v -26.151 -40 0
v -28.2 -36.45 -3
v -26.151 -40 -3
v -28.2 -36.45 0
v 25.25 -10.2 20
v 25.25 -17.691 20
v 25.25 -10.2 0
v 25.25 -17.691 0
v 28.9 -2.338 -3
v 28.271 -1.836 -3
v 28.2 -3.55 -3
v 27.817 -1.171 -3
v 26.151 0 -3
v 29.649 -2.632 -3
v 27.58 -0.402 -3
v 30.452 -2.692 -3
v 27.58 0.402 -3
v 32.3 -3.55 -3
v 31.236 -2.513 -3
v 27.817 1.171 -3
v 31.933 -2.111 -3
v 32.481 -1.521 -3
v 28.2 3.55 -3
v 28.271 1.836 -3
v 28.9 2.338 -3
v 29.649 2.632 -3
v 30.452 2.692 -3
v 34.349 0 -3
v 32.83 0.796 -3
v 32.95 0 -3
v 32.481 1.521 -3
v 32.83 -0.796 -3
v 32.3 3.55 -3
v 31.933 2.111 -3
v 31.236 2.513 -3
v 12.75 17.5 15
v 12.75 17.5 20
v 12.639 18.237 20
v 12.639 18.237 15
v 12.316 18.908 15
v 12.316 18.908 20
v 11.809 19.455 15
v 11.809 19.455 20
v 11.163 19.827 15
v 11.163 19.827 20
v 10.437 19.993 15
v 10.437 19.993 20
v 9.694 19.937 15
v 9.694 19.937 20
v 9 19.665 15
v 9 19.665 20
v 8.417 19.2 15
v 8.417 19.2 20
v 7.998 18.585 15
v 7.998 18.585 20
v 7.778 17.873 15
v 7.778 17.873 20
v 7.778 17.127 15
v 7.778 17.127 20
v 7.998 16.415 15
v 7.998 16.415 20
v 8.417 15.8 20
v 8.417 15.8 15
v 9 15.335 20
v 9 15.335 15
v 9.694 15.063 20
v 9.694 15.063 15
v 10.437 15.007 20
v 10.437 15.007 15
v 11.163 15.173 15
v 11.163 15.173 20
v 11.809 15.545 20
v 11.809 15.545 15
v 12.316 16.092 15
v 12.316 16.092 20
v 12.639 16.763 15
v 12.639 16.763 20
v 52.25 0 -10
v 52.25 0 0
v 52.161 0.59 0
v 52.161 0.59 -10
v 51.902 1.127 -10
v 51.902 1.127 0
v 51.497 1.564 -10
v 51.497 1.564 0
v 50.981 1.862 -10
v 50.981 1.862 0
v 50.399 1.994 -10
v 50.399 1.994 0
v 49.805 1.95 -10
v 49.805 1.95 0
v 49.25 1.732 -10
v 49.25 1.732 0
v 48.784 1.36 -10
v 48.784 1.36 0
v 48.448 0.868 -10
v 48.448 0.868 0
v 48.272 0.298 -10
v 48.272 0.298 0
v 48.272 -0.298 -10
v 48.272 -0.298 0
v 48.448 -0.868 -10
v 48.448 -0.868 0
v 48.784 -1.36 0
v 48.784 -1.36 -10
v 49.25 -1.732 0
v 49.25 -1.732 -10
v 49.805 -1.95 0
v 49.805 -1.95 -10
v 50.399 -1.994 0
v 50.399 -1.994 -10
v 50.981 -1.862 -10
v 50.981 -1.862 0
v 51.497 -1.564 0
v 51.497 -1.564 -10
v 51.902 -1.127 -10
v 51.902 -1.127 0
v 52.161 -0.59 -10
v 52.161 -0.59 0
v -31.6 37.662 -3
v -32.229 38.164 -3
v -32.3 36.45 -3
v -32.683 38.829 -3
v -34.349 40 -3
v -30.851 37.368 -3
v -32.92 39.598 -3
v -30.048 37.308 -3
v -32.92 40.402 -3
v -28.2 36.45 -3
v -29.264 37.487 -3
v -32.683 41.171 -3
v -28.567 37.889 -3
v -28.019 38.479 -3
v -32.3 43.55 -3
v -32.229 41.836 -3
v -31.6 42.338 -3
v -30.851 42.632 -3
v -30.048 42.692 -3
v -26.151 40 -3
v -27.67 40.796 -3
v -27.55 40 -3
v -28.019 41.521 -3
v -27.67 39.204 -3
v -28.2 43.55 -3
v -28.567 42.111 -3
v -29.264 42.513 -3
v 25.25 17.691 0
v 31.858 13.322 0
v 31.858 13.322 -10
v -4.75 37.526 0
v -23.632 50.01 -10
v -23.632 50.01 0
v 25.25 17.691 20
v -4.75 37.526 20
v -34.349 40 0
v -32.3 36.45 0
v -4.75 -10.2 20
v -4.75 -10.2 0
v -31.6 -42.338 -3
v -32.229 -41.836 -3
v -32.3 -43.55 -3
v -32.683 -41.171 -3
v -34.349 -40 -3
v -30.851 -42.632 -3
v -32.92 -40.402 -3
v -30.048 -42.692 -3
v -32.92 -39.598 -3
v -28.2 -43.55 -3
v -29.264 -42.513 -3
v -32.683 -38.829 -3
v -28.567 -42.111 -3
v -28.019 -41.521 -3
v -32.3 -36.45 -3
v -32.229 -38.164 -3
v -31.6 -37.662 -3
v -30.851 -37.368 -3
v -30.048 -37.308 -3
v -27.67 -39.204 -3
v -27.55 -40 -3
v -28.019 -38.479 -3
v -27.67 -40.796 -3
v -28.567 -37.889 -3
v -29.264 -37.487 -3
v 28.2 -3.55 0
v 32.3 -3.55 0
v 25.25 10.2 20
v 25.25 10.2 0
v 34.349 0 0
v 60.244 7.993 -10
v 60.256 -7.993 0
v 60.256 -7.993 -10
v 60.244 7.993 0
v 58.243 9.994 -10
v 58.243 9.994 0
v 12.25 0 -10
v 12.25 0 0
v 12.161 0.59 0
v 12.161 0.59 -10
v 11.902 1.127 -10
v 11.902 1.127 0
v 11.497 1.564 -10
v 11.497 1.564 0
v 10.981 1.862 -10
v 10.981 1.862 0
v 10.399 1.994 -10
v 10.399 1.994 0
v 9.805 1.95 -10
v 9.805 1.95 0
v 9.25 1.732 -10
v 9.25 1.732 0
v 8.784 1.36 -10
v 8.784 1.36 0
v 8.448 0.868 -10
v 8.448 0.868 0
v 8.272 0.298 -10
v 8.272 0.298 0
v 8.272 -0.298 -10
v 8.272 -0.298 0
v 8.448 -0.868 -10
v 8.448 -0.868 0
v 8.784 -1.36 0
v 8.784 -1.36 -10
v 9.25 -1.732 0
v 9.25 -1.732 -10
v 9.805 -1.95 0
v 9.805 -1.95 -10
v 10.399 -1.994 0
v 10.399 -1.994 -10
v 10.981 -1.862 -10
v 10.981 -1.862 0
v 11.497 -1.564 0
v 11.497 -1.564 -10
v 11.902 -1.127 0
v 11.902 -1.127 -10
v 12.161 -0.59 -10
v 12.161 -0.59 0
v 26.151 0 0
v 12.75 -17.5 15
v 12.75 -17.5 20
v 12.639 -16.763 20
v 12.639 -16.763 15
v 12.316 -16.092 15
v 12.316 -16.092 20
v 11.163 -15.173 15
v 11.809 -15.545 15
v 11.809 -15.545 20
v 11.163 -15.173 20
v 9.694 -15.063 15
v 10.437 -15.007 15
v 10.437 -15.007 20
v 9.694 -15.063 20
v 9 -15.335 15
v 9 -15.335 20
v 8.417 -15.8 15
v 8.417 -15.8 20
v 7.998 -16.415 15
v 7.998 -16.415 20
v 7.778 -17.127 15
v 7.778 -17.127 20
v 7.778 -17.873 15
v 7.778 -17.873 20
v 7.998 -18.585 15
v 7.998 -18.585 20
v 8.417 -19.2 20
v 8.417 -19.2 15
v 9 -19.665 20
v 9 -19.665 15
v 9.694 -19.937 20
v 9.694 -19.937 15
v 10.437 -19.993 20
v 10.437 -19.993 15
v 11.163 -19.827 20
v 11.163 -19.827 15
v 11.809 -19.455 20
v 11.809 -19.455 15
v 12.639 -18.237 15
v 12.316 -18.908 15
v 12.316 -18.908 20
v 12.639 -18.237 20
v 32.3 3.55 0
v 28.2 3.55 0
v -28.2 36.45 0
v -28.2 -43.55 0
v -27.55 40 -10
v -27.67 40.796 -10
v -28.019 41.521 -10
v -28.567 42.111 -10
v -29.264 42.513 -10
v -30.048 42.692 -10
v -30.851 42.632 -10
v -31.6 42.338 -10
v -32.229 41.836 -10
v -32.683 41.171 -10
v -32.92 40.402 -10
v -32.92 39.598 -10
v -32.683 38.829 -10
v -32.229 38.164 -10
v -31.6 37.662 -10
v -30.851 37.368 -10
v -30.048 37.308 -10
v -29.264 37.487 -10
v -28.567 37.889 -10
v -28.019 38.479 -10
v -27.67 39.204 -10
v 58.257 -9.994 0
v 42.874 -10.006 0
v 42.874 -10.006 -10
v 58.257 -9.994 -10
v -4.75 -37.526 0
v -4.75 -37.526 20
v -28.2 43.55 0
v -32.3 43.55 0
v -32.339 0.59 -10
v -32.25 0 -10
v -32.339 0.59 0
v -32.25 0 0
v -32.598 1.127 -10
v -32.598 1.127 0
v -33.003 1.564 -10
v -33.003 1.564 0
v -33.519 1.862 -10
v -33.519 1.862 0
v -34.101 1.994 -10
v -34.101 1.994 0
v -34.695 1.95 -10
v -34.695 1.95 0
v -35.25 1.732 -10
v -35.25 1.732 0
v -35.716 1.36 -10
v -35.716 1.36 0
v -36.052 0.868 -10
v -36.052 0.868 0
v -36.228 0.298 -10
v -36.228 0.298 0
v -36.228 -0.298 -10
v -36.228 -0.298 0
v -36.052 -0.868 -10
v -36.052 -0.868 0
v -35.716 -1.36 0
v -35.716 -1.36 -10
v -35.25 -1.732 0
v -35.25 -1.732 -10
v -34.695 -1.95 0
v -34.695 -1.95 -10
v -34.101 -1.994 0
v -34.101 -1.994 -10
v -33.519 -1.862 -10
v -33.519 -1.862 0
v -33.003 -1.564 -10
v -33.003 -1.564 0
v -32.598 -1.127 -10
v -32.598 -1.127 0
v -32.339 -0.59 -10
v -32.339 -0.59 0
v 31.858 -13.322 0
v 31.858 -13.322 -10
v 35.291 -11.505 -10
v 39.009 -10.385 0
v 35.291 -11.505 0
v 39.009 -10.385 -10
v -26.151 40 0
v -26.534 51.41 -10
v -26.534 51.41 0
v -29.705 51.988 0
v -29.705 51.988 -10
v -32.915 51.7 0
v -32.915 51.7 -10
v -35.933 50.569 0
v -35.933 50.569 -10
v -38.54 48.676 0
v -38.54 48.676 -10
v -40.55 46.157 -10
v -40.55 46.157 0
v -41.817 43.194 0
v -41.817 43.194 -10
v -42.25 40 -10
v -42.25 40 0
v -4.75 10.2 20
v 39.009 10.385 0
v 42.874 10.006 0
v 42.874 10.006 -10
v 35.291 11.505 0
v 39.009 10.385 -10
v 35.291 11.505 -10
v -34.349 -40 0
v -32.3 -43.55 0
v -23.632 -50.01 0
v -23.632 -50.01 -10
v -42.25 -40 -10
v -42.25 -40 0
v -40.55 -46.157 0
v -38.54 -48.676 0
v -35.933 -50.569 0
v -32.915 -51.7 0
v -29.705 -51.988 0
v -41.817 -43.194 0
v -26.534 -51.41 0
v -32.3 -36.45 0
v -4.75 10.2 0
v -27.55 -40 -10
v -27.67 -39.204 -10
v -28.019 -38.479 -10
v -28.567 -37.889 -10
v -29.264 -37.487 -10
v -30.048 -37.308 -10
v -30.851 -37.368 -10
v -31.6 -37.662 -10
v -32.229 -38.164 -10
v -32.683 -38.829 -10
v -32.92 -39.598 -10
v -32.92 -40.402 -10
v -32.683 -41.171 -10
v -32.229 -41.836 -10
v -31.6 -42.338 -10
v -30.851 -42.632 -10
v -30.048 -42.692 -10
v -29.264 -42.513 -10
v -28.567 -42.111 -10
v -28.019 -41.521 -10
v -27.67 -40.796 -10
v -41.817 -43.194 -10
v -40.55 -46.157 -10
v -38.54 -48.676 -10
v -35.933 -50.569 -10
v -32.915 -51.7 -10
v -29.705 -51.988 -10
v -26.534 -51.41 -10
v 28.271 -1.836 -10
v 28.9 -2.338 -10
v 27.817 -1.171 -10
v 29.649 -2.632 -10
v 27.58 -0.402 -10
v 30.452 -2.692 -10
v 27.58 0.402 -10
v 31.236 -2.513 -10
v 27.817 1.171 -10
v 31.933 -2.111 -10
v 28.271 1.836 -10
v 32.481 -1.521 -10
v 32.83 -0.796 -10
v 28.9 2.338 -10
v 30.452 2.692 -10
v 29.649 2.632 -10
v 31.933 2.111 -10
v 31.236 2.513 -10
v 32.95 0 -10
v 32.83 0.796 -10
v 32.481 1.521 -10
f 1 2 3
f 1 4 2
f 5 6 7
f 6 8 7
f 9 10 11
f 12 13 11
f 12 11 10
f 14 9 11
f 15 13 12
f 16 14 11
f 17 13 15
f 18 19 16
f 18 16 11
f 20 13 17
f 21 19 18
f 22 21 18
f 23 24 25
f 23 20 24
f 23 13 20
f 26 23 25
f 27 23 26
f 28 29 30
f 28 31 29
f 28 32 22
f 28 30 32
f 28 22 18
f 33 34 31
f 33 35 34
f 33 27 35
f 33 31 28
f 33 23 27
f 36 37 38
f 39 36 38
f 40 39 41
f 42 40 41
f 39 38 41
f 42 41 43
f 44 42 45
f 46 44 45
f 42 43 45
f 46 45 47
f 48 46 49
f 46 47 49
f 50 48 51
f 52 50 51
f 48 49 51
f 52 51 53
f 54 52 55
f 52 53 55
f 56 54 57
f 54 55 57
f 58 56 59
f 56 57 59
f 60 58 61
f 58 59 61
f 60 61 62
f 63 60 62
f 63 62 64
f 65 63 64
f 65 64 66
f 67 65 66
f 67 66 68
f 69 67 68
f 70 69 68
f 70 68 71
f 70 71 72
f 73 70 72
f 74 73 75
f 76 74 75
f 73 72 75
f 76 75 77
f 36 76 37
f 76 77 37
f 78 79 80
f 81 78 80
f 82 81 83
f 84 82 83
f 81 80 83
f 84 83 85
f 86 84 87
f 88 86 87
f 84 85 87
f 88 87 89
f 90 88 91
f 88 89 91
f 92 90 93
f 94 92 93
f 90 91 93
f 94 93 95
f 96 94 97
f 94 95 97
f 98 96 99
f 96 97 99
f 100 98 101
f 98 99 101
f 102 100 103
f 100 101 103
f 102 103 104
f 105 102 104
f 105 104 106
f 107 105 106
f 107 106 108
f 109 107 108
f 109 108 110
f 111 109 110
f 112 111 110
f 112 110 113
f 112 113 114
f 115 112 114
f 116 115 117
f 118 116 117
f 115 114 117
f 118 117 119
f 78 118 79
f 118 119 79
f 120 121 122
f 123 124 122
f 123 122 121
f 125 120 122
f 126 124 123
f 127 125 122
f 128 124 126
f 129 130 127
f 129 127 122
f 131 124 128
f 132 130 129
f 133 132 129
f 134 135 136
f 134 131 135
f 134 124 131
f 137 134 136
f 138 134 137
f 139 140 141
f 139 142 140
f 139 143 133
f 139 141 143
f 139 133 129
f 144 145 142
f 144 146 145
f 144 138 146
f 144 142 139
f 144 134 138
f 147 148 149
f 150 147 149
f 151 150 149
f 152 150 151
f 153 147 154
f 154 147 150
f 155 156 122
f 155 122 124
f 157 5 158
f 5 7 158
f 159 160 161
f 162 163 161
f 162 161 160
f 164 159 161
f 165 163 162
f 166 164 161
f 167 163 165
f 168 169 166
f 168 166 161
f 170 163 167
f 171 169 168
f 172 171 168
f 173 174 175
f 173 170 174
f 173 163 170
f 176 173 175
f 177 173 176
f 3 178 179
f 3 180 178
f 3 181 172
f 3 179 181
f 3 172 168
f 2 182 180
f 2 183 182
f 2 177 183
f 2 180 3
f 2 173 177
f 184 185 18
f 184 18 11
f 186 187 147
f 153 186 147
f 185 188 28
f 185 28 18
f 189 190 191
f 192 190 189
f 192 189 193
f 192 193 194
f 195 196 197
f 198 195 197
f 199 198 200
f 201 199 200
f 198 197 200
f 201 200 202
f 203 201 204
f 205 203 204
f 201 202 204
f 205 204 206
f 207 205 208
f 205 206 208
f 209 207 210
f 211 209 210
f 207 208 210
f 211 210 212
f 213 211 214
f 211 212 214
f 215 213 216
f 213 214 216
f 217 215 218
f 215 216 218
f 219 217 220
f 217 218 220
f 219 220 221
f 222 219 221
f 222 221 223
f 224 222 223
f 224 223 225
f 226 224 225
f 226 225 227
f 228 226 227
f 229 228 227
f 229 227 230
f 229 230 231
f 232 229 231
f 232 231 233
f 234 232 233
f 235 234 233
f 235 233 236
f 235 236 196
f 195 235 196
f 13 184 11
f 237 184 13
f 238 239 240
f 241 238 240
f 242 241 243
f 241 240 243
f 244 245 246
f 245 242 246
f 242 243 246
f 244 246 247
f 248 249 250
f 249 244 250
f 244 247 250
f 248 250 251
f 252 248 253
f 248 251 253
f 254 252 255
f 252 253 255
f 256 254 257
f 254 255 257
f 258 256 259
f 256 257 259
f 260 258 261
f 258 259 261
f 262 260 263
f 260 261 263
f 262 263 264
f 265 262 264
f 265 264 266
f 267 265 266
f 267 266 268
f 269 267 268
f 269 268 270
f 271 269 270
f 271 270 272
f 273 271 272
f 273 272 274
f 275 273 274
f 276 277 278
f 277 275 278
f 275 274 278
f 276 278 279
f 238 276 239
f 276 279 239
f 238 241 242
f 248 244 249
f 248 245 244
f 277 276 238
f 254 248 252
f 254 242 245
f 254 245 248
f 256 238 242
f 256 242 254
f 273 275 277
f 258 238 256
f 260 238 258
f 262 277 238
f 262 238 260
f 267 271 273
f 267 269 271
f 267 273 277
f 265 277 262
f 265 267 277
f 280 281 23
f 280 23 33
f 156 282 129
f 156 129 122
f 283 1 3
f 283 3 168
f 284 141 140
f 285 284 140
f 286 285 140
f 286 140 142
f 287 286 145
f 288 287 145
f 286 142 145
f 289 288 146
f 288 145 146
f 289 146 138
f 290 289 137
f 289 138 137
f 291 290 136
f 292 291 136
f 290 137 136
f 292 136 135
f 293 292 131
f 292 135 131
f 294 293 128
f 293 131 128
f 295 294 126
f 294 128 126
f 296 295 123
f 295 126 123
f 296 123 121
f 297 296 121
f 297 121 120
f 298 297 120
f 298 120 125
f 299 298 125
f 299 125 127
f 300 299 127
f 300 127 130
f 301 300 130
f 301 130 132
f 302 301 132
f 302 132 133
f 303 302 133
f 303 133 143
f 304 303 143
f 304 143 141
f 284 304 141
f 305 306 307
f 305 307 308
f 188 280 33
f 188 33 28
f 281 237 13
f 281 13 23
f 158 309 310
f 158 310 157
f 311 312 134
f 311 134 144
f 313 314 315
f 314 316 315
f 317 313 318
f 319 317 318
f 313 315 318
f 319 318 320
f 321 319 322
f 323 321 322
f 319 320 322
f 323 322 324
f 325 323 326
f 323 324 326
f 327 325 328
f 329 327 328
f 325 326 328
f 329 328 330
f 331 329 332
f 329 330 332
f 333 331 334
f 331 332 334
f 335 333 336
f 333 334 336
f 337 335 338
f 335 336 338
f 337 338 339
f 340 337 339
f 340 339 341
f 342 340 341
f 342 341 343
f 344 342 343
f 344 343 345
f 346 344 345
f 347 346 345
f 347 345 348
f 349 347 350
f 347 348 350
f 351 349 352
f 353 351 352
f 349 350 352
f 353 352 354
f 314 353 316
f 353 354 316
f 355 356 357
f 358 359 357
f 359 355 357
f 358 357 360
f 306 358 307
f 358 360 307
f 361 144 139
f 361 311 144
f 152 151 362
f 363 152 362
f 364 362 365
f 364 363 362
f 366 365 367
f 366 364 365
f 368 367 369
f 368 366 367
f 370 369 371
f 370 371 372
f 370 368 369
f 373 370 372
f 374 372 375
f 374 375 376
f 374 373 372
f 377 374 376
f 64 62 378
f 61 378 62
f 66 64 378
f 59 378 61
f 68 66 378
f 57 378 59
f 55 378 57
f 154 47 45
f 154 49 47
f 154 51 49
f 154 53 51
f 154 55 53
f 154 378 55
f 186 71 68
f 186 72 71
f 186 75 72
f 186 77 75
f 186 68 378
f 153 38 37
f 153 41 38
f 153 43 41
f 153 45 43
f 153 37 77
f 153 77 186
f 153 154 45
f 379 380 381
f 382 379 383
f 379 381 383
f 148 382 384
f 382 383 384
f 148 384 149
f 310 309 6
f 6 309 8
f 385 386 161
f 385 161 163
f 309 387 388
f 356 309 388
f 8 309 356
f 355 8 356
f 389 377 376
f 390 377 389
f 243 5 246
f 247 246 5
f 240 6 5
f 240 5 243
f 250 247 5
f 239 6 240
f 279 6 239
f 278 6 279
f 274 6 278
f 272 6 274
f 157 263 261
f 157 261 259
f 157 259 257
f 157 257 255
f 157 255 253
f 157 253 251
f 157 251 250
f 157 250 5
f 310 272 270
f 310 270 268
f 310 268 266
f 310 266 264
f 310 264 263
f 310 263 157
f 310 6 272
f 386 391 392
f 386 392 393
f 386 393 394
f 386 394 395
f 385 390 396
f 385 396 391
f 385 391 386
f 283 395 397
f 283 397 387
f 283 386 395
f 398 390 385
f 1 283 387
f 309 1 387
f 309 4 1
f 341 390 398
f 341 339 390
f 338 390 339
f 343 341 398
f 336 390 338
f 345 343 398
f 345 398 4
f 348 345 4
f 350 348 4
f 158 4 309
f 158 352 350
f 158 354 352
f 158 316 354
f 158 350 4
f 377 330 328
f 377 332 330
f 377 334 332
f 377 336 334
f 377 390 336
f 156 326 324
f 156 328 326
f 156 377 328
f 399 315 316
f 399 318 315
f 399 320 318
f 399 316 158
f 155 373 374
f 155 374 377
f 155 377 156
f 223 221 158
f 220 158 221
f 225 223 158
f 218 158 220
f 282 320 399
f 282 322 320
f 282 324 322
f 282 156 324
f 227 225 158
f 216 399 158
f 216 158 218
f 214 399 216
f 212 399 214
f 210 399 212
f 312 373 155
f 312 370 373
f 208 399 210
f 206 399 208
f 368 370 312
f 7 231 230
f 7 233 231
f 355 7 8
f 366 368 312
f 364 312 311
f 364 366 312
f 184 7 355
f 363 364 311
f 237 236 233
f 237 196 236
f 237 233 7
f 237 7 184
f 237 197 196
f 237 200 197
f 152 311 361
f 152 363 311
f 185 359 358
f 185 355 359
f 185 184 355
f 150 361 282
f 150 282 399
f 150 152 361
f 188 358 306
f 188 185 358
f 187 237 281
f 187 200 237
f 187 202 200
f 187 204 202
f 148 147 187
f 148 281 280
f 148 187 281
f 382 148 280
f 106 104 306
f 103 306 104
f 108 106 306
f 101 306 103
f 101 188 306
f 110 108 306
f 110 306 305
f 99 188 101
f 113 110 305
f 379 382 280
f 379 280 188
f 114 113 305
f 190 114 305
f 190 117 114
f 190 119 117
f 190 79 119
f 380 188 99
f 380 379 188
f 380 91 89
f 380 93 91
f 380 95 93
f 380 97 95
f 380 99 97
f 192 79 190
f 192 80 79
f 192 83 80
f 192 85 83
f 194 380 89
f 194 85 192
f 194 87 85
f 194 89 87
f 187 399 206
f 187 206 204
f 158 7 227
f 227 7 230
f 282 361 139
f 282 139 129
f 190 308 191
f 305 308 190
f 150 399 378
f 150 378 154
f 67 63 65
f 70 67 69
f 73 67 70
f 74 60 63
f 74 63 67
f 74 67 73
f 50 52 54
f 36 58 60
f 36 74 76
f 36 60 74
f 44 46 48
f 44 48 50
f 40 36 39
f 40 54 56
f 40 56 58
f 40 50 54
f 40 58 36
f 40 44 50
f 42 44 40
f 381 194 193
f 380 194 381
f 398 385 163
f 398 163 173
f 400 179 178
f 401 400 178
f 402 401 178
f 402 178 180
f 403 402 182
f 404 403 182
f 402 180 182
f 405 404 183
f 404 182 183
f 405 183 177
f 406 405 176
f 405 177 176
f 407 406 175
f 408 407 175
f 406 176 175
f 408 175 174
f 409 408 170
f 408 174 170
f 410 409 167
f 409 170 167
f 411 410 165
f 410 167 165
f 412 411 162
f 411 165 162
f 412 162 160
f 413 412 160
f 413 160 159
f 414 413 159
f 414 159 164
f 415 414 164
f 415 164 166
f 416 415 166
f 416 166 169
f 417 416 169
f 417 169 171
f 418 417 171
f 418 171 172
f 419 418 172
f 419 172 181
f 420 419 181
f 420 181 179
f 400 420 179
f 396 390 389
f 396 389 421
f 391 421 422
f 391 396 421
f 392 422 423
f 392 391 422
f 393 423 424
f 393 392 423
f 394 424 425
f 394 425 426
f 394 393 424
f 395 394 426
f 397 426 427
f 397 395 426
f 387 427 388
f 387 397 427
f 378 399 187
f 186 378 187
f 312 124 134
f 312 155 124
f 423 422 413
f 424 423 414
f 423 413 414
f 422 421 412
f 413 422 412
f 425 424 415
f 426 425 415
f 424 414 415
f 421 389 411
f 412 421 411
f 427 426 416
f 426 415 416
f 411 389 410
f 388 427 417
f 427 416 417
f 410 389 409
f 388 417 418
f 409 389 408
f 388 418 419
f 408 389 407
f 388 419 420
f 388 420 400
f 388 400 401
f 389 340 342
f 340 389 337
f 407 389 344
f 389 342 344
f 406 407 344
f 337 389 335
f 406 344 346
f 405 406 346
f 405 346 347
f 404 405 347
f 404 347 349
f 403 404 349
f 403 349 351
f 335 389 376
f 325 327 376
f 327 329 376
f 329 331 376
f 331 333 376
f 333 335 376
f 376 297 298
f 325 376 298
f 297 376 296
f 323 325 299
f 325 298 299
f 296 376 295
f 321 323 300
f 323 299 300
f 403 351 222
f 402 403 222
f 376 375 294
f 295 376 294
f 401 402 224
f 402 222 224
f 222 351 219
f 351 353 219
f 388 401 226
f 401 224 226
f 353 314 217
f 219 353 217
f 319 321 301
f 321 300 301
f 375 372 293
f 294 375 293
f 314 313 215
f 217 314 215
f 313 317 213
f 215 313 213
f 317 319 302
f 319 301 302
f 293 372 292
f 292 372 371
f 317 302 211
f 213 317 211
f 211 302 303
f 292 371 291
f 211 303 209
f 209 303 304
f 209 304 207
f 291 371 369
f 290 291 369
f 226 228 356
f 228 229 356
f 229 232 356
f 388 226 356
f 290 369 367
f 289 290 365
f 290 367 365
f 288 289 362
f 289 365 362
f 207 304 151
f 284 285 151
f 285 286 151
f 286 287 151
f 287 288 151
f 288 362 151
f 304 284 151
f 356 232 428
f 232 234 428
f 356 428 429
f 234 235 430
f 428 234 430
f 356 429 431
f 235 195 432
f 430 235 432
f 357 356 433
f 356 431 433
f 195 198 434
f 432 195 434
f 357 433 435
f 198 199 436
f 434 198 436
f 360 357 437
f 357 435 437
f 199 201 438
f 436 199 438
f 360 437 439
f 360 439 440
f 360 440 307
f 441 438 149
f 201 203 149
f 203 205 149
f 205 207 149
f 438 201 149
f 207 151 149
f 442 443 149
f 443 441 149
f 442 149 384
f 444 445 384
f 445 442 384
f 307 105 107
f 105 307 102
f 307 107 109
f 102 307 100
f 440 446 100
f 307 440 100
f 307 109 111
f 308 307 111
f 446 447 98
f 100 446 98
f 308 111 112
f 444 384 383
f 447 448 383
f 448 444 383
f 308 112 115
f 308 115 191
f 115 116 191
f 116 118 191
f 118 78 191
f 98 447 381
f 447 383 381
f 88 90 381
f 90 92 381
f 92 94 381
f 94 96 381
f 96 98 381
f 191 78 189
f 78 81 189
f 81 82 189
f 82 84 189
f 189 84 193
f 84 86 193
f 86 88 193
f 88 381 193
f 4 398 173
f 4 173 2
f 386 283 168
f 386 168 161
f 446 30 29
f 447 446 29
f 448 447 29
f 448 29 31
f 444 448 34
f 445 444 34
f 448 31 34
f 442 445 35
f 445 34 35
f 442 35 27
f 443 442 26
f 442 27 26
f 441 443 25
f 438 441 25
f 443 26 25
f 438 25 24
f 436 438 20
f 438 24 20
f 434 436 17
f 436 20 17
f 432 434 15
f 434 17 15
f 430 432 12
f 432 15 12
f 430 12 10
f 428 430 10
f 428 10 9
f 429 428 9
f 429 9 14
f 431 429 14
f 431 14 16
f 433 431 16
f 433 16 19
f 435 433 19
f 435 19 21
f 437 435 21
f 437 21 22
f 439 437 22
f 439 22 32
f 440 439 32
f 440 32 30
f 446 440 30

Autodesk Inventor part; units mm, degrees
ref_plane "YZ Plane" through (0, 0, 0) normal (1, 0, 0) x (0, 1, 0)
ref_plane "XZ Plane" through (0, 0, 0) normal (0, 1, 0) x (-1, 0, 0)
ref_plane "XY Plane" through (0, 0, 0) normal (0, 0, 1) x (1, 0, 0)
sketch "Sketch1" plane through (0, 0, 0) normal (0, 0, 1) x (1, 0, 0)
  line L0 (0, 0) -> (30.25, 0) construction
  line L1 (0, 0) -> (-30.25, 0) construction
  line L2 (-30.25, 0) -> (-30.25, 40) construction
  line L3 (-30.25, 0) -> (-30.25, -40) construction
  circle A0 centre (-30.25, 40) radius 2.7
  circle A1 centre (-30.25, -40) radius 2.7
  circle A2 centre (30.25, 0) radius 2.7
  circle A3 centre (-30.25, 40) radius 12
  circle A4 centre (-30.25, -40) radius 12
  circle A5 centre (30.25, 0) radius 12
  line L4 (36.868172, -10.009985) -> (-23.631828, -50.009985)
  line L5 (-42.25, 40) -> (-42.25, -40)
  circle A6 centre (-34.25, 0) radius 2
  line L6 (-30.25, 0) -> (-34.25, 0) construction
  line L7 (-23.631828, 50.009985) -> (36.868172, 10.009985)
  line L8 (30.25, 0) -> (50.25, 0) construction
  circle A7 centre (50.25, 0) radius 10
  circle A8 centre (50.25, 0) radius 2
  line L9 (50.25746, 9.999997) -> (36.868172, 10.009985)
  line L10 (50.25746, -9.999997) -> (36.868172, -10.009985)
  circle A9 centre (10.25, 0) radius 2
  line L11 (50.25746, -9.999997) -> (60.257457, -9.992538)
  line L12 (60.257457, -9.992538) -> (60.242549, 9.992549)
  line L13 (60.242549, 9.992549) -> (50.25746, 9.999997)
  point P0 (-42.25, 0)
  point P1 (41.35, -4.559605)
  point P2 (41.35, 4.559605)
  point P3 (60.249997, 0.00746)
  dimension "d0" = 60.5
  dimension "d1" = 5.4
  dimension "d2" = 80
  dimension "d3" = 24
  dimension "d55" = 4
  dimension "d56" = 8
  dimension "d57" = 20
  dimension "d58" = 20
  dimension "d69" = 20
sketch "Sketch1 outline for Extrusion1" plane through (0, 0, 0) normal (0, 0, 1) x (1, 0, 0)
  arc A0 (-23.631828, 50.009985) -> (-42.25, 40) centre (-30.25, 40) ccw
  line L0 (-42.25, 40) -> (-42.25, -40)
  arc A1 (-42.25, -40) -> (-23.631828, -50.009985) centre (-30.25, -40) ccw
  line L1 (-23.631828, -50.009985) -> (36.868172, -10.009985)
  line L2 (36.868172, -10.009985) -> (60.257457, -9.992538)
  line L3 (60.257457, -9.992538) -> (60.242549, 9.992549)
  line L4 (60.242549, 9.992549) -> (36.868172, 10.009985)
  line L5 (36.868172, 10.009985) -> (-23.631828, 50.009985)
  circle A2 centre (-30.25, 40) radius 2.7
  circle A3 centre (10.25, 0) radius 2
  circle A4 centre (-34.25, 0) radius 2
  circle A5 centre (30.25, 0) radius 2.7
  circle A6 centre (-30.25, -40) radius 2.7
  circle A7 centre (50.25, 0) radius 2
extrude "Extrusion1" add sketch "Sketch1 outline for Extrusion1" against normal blind 10
fillet "Fillet1" radius 20 2 edges at (36.8682, 10.01, -5) (36.8682, -10.01, -5)
chamfer "Chamfer6" distance 2 angle 45 2 edges at (60.2425, 9.9925, -5) (60.2575, -9.9925, -5)
sketch "Sketch8" plane through (0, 0, 0) normal (0, 0, 1) x (1, 0, 0)
  line L0 (58.257457, -9.99403) -> (60.255965, -7.992538)
  line L1 (58.257457, -9.99403) -> (42.873828, -10.005505)
  arc A0 (42.873828, -10.005505) -> (31.85846, -13.322191) centre (42.888747, -30.0055) ccw
  line L2 (31.85846, -13.322191) -> (-23.631828, -50.009985)
  arc A1 (-42.25, -40) -> (-23.631828, -50.009985) centre (-30.25, -40) ccw
  line L3 (-42.25, -40) -> (-42.25, 40)
  arc A2 (-23.631828, 50.009985) -> (-42.25, 40) centre (-30.25, 40) ccw
  line L4 (-23.631828, 50.009985) -> (31.85846, 13.322191)
  arc A3 (31.85846, 13.322191) -> (42.873828, 10.005505) centre (42.888747, 30.0055) ccw
  line L5 (42.873828, 10.005505) -> (58.242549, 9.994041)
  line L6 (60.244041, 7.992549) -> (58.242549, 9.994041)
  line L7 (60.244041, 7.992549) -> (60.255965, -7.992538)
  circle A4 centre (30.25, 0) radius 2.7
  circle A5 centre (50.25, 0) radius 2
  circle A6 centre (-30.25, -40) radius 2.7
  circle A7 centre (-34.25, 0) radius 2
  circle A8 centre (10.25, 0) radius 2
  circle A9 centre (-30.25, 40) radius 2.7
  line L8 (-28.200407, -43.55) -> (-32.299593, -43.55)
  line L9 (-32.299593, -43.55) -> (-34.349187, -40)
  line L10 (-34.349187, -40) -> (-32.299593, -36.45)
  line L11 (-32.299593, -36.45) -> (-28.200407, -36.45)
  line L12 (-28.200407, -36.45) -> (-26.150813, -40)
  line L13 (-26.150813, -40) -> (-28.200407, -43.55)
  line L14 (-28.200407, 36.45) -> (-32.299593, 36.45)
  line L15 (-32.299593, 36.45) -> (-34.349187, 40)
  line L16 (-34.349187, 40) -> (-32.299593, 43.55)
  line L17 (-32.299593, 43.55) -> (-28.200407, 43.55)
  line L18 (-28.200407, 43.55) -> (-26.150813, 40)
  line L19 (-26.150813, 40) -> (-28.200407, 36.45)
  line L20 (32.299593, -3.55) -> (28.200407, -3.55)
  line L21 (28.200407, -3.55) -> (26.150813, 0)
  line L22 (26.150813, 0) -> (28.200407, 3.55)
  line L23 (28.200407, 3.55) -> (32.299593, 3.55)
  line L24 (32.299593, 3.55) -> (34.349187, 0)
  line L25 (34.349187, 0) -> (32.299593, -3.55)
  point P0 (0, 0)
  dimension "d83" = 7.1
  dimension "d84" = 7.1
  dimension "d85" = 7.1
extrude "Extrusion9" cut sketch "Sketch8" against normal blind 3 contours L8 L9 L10 L11 L12 L13 | L14 L15 L16 L17 L18 L19 | L20 L21 L22 L23 L24 L25
sketch "Sketch5" plane through (0, 0, 0) normal (0, 0, 1) x (1, 0, 0)
  arc A0 (-42.25, -40) -> (-23.631828, -50.009985) centre (-30.25, -40) ccw
  line L0 (-23.631828, -50.009985) -> (31.85846, -13.322191)
  arc A1 (42.873828, -10.005505) -> (31.85846, -13.322191) centre (42.888747, -30.0055) ccw
  line L1 (42.873828, -10.005505) -> (58.257457, -9.99403)
  arc A2 (31.85846, 13.322191) -> (42.873828, 10.005505) centre (42.888747, 30.0055) ccw
  line L2 (31.85846, 13.322191) -> (-23.631828, 50.009985)
  arc A3 (-23.631828, 50.009985) -> (-42.25, 40) centre (-30.25, 40) ccw
  line L3 (-42.25, 40) -> (-42.25, -40)
  circle A4 centre (-34.25, 0) radius 2
  circle A5 centre (50.25, 0) radius 2
  line L4 (-4.75, 10.2) -> (-4.75, 37.526132)
  line L5 (-4.75, 10.2) -> (25.25, 10.2)
  line L6 (25.25, 10.2) -> (25.25, 17.691421)
  line L7 (60.255965, -7.992538) -> (60.244041, 7.992549)
  line L8 (58.242549, 9.994041) -> (42.873828, 10.005505)
  line L9 (60.255965, -7.992538) -> (58.257457, -9.99403)
  line L10 (58.242549, 9.994041) -> (60.244041, 7.992549)
  dimension "d66" = 30
  dimension "d92" = 10.2
  dimension "d93" = 25
extrude "Extrusion6" add sketch "Sketch5" along normal blind 20 contours L2 L6 L5 L4
sketch "Sketch9" plane through (0, 0, 20) normal (0, 0, 1) x (1, 0, 0)
  circle A0 centre (10.25, 0) radius 2
  line L0 (25.25, 10.2) -> (25.25, 17.691421)
  line L1 (25.25, 17.691421) -> (-4.75, 37.526132)
  line L2 (-4.75, 37.526132) -> (-4.75, 10.2)
  line L3 (-4.75, 10.2) -> (25.25, 10.2)
  line L4 (10.25, 0) -> (10.25, 17.5) construction
  circle A1 centre (10.25, 17.5) radius 2.5
  point P0 (0, 0)
  dimension "d88" = 17.5
  dimension "d89" = 5
extrude "Extrusion10" cut sketch "Sketch9" against normal blind 5 contours A1
mirror "Mirror1" about plane through (0, 0, 0) normal (0, 1, 0) of "Extrusion10", "Extrusion6"
equation "\"d84\" = d83"
equation "\"d85\" = d83"
equation "\"b\" = 2"
properties part number "y axis something back_3DPrint"
